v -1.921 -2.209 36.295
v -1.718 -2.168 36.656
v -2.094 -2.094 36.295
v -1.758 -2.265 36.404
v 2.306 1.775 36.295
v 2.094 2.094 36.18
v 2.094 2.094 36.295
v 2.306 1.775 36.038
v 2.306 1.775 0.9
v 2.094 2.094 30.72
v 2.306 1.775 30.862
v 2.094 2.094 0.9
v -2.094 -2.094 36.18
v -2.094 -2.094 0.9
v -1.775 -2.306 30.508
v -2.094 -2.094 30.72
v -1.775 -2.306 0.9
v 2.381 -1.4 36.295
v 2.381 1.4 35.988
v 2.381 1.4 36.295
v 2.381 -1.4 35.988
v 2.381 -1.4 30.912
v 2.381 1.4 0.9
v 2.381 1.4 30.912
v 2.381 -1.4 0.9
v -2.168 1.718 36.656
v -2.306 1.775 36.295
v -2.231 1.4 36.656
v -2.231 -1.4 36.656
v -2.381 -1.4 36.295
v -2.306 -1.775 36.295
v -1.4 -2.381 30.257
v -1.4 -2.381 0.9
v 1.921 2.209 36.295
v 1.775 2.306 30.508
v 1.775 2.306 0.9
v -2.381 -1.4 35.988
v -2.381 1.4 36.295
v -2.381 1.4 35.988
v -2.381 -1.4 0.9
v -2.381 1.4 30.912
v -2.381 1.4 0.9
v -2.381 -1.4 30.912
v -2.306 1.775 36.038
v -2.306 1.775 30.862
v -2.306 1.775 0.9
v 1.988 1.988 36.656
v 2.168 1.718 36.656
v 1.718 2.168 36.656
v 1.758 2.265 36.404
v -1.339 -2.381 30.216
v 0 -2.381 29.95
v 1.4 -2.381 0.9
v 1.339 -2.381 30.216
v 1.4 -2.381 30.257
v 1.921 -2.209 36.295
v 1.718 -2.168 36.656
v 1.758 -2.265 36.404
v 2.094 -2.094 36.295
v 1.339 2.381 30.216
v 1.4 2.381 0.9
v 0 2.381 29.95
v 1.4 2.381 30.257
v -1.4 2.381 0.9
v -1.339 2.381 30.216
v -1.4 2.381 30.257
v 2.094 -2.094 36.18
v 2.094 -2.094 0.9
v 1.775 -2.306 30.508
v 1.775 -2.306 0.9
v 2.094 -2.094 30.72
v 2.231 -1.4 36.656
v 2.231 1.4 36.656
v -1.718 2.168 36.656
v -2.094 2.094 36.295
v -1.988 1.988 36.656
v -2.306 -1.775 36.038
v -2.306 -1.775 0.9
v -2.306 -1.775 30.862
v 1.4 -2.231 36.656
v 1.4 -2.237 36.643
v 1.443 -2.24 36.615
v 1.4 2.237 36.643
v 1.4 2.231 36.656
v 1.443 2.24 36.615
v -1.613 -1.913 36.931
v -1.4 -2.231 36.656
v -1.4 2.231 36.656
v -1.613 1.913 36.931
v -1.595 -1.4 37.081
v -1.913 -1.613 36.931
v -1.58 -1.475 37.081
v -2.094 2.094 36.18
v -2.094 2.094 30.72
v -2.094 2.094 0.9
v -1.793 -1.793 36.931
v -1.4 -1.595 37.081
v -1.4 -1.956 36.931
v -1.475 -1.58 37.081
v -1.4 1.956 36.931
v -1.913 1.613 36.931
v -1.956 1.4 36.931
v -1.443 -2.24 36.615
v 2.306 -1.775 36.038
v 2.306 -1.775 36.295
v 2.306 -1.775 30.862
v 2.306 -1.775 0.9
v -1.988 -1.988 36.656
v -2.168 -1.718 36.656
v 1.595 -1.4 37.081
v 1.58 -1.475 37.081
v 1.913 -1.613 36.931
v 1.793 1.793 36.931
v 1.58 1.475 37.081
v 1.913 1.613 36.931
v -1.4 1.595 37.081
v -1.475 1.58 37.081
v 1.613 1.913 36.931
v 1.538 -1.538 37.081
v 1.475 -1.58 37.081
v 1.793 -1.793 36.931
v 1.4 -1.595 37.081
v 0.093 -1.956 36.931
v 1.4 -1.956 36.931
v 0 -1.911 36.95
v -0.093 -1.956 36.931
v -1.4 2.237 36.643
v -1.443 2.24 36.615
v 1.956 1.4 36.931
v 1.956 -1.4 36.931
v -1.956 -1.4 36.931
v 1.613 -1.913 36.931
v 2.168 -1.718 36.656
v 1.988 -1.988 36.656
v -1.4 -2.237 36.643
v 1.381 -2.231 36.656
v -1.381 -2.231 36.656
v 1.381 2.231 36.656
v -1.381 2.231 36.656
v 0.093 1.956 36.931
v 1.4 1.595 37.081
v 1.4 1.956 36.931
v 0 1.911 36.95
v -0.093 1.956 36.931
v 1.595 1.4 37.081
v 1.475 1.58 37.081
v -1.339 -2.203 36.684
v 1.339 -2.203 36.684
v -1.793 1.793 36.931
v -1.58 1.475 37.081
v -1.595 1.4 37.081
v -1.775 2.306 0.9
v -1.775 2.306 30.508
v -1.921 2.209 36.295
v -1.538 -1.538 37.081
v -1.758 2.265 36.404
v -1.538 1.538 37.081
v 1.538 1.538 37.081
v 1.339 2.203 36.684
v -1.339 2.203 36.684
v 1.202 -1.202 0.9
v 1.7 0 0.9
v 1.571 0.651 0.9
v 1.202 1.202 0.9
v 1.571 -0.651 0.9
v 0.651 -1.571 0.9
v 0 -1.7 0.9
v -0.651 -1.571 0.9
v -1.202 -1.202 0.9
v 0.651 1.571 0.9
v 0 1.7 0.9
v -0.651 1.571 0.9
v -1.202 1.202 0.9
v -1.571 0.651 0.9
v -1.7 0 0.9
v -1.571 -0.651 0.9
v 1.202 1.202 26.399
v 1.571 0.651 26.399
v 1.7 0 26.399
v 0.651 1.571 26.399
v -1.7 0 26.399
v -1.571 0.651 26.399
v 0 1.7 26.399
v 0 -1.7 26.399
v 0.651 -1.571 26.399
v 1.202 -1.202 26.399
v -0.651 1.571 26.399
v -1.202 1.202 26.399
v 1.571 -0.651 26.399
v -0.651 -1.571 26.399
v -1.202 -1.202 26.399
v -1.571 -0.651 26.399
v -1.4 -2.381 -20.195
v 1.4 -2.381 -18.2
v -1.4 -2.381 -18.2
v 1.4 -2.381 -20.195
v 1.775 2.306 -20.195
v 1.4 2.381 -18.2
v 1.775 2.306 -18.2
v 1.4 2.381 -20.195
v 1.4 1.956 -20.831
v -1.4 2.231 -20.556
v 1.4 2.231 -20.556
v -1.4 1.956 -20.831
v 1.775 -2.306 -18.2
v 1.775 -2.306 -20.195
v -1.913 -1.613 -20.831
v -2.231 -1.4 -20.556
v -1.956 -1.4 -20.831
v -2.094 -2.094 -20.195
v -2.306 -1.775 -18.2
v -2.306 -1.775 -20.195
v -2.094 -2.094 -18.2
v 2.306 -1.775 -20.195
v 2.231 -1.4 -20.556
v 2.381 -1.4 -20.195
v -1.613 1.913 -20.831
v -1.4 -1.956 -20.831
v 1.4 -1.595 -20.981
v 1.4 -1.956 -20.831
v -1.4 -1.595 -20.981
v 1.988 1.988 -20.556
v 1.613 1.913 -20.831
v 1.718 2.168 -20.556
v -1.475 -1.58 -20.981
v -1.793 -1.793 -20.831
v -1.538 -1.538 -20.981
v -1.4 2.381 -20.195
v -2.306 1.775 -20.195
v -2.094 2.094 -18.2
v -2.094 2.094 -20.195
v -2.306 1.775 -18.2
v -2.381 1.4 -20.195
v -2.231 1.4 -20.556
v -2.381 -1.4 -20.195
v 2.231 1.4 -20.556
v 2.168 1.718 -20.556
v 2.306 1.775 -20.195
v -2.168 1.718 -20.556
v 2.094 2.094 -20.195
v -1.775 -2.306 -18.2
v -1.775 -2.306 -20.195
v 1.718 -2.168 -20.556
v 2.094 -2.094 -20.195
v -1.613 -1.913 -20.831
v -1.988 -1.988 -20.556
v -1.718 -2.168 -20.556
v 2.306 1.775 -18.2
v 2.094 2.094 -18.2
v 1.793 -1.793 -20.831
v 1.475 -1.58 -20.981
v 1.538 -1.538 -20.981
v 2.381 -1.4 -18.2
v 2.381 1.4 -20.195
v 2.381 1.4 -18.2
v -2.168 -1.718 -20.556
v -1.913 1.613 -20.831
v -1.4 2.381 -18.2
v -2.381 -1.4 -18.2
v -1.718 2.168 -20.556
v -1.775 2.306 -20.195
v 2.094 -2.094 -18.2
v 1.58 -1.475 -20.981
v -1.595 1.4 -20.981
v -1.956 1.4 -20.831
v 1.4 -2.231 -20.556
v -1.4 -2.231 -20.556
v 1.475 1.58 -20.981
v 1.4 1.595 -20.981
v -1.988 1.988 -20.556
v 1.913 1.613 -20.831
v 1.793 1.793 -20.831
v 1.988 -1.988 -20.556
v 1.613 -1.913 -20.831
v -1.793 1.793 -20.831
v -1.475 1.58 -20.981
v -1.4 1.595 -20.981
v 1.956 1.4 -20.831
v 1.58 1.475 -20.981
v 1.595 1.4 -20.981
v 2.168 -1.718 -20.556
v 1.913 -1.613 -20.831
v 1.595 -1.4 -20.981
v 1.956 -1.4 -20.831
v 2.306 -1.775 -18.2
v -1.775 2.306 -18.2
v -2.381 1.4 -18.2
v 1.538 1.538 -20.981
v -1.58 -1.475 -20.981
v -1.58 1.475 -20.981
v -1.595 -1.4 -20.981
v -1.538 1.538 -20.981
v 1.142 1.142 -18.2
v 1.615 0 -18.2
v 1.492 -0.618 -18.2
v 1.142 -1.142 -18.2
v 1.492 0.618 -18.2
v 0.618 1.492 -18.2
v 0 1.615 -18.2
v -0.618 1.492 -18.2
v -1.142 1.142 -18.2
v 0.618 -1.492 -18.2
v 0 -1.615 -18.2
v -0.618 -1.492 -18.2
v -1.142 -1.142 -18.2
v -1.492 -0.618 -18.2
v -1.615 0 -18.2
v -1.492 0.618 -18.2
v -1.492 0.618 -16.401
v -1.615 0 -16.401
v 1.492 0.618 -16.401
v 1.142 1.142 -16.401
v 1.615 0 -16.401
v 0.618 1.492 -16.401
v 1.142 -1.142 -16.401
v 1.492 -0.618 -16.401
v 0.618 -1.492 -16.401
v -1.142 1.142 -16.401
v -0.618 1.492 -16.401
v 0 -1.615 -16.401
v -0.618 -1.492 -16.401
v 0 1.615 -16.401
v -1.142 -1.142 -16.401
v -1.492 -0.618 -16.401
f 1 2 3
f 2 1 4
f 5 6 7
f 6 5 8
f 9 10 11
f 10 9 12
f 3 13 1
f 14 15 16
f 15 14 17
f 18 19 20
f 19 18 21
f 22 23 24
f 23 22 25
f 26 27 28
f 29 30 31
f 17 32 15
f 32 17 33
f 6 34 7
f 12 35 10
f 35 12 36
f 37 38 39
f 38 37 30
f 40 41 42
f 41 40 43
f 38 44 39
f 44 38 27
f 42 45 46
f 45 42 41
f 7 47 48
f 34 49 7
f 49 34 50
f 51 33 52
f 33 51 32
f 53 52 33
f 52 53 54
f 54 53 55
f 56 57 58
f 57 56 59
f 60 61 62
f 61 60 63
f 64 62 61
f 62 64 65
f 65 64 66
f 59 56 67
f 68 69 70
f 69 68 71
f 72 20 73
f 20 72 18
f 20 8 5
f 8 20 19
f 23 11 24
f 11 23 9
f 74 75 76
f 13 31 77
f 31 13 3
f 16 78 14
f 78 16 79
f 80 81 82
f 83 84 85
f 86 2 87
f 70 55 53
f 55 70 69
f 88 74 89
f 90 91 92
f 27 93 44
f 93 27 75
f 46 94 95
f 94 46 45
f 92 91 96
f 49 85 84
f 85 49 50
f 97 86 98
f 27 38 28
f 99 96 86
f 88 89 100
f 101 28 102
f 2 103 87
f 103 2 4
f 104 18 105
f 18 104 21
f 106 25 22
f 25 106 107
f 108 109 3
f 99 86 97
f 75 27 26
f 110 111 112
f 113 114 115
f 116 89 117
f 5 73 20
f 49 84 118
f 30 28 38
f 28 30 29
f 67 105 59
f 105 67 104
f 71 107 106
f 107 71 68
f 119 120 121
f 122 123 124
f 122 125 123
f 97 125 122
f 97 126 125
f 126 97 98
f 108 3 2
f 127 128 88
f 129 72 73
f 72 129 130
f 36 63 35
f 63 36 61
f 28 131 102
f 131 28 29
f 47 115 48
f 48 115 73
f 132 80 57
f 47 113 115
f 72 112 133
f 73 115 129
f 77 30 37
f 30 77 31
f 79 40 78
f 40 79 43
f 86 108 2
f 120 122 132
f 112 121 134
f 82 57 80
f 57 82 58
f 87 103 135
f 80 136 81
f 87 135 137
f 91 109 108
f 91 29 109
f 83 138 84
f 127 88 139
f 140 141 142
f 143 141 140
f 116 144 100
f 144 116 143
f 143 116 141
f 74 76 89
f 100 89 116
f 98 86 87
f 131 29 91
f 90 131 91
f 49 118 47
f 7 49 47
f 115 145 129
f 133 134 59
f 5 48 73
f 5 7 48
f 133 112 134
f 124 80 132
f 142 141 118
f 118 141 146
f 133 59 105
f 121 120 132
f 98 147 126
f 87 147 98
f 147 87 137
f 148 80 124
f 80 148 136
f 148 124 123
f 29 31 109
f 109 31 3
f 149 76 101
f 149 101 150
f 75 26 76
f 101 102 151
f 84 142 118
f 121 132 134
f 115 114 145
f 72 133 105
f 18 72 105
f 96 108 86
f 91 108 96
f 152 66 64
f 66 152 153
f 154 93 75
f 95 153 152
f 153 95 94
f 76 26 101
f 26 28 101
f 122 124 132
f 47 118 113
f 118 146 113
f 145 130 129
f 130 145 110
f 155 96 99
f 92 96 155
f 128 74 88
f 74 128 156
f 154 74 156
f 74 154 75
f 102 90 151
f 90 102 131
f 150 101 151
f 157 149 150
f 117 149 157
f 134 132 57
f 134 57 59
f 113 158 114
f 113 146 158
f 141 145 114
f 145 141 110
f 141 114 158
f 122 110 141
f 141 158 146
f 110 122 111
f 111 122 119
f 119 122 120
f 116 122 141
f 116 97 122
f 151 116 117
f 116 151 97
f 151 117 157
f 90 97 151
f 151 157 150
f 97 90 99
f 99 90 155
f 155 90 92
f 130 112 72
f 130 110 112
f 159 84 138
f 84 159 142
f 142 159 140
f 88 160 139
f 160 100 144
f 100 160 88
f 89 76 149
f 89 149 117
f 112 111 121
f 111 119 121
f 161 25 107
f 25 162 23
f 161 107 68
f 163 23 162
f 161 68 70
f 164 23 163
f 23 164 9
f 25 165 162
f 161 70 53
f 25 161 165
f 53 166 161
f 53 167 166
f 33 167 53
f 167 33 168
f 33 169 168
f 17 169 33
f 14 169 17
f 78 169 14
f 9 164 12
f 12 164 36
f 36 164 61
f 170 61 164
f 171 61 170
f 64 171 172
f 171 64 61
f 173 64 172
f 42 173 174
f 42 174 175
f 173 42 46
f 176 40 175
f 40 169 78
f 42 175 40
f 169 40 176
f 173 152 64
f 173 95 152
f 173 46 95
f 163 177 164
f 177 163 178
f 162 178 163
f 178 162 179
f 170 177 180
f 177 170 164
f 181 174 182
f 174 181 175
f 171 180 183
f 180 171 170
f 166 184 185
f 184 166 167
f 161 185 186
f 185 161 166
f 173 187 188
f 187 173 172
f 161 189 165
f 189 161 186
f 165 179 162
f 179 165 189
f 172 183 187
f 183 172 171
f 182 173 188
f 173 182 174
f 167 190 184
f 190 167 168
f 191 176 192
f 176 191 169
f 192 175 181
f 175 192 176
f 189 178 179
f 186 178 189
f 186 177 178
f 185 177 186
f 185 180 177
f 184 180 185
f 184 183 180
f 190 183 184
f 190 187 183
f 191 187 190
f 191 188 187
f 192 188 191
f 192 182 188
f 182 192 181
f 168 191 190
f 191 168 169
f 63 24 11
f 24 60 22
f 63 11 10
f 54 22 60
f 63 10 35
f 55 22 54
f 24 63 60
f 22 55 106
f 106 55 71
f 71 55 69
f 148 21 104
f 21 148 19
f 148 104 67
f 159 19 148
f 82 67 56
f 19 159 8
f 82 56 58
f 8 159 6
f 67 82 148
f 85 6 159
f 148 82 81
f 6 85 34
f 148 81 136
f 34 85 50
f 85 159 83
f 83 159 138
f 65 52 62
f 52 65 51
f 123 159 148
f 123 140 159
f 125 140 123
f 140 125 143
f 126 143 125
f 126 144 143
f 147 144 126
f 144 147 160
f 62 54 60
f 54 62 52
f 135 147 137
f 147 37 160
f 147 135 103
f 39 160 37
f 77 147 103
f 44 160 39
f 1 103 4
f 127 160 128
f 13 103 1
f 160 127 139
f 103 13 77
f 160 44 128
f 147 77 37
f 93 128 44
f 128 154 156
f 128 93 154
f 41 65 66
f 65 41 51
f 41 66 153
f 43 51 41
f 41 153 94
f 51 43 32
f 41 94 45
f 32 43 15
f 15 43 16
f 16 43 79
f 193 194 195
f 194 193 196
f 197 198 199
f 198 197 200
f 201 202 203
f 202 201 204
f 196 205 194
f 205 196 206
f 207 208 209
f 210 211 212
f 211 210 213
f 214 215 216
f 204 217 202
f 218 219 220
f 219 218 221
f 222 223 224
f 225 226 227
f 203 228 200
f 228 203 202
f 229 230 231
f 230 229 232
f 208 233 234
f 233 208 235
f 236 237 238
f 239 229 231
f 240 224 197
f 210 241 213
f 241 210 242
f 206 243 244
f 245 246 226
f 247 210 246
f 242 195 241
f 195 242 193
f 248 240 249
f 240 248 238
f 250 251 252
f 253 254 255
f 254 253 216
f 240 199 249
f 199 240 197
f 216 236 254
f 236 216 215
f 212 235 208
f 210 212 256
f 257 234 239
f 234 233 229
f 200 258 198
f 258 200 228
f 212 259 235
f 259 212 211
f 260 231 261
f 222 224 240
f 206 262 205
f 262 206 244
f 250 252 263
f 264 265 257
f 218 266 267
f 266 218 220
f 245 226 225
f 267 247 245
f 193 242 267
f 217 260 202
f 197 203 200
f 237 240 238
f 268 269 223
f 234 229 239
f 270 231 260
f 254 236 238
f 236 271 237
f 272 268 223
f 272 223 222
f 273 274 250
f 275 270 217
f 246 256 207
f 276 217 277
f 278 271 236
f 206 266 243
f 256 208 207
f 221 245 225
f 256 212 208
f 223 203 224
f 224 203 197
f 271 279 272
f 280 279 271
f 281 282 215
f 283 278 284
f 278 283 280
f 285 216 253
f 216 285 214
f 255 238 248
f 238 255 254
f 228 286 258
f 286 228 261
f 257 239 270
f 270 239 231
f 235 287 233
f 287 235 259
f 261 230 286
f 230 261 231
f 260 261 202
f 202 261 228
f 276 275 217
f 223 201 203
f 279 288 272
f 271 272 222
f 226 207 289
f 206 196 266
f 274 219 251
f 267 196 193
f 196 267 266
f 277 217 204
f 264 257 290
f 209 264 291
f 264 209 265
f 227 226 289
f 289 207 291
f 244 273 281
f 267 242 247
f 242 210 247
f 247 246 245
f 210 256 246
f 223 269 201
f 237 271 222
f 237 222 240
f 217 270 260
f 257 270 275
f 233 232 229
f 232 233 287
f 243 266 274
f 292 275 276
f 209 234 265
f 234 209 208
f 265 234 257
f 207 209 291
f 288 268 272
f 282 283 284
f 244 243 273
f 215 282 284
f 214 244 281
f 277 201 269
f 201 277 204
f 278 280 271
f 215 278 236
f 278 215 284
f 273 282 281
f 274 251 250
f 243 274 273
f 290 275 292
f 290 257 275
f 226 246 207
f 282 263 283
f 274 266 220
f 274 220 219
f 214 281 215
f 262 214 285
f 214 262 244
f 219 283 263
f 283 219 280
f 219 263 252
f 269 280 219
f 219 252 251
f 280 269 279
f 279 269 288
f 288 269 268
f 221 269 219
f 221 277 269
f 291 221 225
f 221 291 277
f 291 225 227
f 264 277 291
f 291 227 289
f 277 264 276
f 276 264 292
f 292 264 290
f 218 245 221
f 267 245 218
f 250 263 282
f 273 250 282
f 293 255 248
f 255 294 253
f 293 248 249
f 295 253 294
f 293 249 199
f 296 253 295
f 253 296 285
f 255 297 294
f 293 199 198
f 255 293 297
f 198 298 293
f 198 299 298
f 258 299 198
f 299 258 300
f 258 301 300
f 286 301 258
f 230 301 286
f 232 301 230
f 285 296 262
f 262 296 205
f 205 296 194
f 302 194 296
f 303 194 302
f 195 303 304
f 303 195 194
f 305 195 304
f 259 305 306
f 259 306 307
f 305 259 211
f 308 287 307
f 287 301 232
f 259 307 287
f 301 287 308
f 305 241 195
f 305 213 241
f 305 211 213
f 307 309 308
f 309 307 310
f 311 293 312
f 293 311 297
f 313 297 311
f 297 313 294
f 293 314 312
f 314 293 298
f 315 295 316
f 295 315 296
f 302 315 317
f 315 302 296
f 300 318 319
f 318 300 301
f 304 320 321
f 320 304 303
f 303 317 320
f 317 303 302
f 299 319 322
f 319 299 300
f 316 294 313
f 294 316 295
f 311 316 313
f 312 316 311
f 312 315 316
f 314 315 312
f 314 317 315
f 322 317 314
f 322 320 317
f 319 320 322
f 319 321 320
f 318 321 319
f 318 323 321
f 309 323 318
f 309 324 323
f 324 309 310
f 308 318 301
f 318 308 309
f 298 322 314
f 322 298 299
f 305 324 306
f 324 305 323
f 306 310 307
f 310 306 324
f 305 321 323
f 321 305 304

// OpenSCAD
//key-fob-1, a simple keychain fob made of clear plastic
//Consists of a body and endcap. Body has cylindrical cavity inside to accept a small tritium glow tube. Designed for fishing lures sourced from the UK.
//Seal the fob by using superglue or epoxy to bond the endcap permanently in place.
//units are mm

$fn = 16;

//"gt" refers to "glow tube"
gt_L = 25;                  //length of tritium glow tube
gt_r = 3 / 2;                       //radius of tritium glow tube
slop_r = 0.2;               //additional radius to accomodate variation / aid insertion
slop_L = 0.5;            //additional length to accomodate variation in gt_L

T = 0.9;                        //wall thickness (minimum)
cap_plug_L = T*2;     //how far the cap's plug extends into the glowtube channel
cap_head_L = cap_plug_L / 2;    //length of head portion of cap (external portion)
fillet_r = 1;                   //fillet radius
keychain_hole_r = 3.5;    //radius of hole that keychain attaches to

body_core_x = 2*(gt_r + T - fillet_r);
body_core_y = body_core_x;

//body length
body_L = cap_plug_L + slop_L + gt_L + T + 2*keychain_hole_r + T;

//Glowtube channel length and radius
channel_L = gt_L + slop_L;
channel_r = gt_r + slop_r;

//construct the main body
difference() {
    //an axially centered filleted rectangular prism
    translate( [-body_core_x / 2, -body_core_y / 2, 0] ){
        minkowski() {
            //a rectangular prism forms the core of the body
            cube( size=[body_core_x, body_core_y, body_L ] );
            //a sphere forms the fillet surface of the body via minkowski summation
            sphere( r=fillet_r );
        }
    }
    
    //cut off the region which will be occupied by the cap
    translate( [-50, -50, -50] ) {
        cube( size= [100,100,cap_head_L + 50 ] );
    }
    
    //bore out the channel
    translate( [0, 0, cap_head_L-0.001] ) {
        cylinder( r= channel_r, h = channel_L );
    }
    
    //bore out the keychain hole
    translate( [0,25,body_L - T - keychain_hole_r/2] ) {
        rotate( a=[90,0,0] ) {
            cylinder( r=keychain_hole_r, h=50 );
        }
    }
}

//construct the cap
translate( [0,0,-20]){      //get it out of the way
    union() {
        //an axially centered filleted rectangular prism with an end sliced off
        translate( [-body_core_x / 2, -body_core_y / 2, 0] ){       //centering operation
                difference() {
                    minkowski() {                                                                               //fillet
                        //a rectangular prism 10 longer than necessary
                        cube( size=[body_core_x, body_core_y, cap_head_L+10] );
                        //a sphere forms the fillet surface of the body via minkowski summation
                        sphere( r=fillet_r );
                    }
                    //cutting cube
                    translate( [body_core_x/2-5,body_core_y/2-5,cap_plug_L] ) {
                        cube( size=[body_core_x+10, body_core_y+10, cap_plug_L+10] );
                    }
                }
                
            }
           //add the plug
            translate( [0,0 , cap_head_L + cap_plug_L/2 - 0.001] ) {
               cylinder( r=channel_r*0.95, h=cap_plug_L );
           }
     }           
        
   
}
            

    
    
